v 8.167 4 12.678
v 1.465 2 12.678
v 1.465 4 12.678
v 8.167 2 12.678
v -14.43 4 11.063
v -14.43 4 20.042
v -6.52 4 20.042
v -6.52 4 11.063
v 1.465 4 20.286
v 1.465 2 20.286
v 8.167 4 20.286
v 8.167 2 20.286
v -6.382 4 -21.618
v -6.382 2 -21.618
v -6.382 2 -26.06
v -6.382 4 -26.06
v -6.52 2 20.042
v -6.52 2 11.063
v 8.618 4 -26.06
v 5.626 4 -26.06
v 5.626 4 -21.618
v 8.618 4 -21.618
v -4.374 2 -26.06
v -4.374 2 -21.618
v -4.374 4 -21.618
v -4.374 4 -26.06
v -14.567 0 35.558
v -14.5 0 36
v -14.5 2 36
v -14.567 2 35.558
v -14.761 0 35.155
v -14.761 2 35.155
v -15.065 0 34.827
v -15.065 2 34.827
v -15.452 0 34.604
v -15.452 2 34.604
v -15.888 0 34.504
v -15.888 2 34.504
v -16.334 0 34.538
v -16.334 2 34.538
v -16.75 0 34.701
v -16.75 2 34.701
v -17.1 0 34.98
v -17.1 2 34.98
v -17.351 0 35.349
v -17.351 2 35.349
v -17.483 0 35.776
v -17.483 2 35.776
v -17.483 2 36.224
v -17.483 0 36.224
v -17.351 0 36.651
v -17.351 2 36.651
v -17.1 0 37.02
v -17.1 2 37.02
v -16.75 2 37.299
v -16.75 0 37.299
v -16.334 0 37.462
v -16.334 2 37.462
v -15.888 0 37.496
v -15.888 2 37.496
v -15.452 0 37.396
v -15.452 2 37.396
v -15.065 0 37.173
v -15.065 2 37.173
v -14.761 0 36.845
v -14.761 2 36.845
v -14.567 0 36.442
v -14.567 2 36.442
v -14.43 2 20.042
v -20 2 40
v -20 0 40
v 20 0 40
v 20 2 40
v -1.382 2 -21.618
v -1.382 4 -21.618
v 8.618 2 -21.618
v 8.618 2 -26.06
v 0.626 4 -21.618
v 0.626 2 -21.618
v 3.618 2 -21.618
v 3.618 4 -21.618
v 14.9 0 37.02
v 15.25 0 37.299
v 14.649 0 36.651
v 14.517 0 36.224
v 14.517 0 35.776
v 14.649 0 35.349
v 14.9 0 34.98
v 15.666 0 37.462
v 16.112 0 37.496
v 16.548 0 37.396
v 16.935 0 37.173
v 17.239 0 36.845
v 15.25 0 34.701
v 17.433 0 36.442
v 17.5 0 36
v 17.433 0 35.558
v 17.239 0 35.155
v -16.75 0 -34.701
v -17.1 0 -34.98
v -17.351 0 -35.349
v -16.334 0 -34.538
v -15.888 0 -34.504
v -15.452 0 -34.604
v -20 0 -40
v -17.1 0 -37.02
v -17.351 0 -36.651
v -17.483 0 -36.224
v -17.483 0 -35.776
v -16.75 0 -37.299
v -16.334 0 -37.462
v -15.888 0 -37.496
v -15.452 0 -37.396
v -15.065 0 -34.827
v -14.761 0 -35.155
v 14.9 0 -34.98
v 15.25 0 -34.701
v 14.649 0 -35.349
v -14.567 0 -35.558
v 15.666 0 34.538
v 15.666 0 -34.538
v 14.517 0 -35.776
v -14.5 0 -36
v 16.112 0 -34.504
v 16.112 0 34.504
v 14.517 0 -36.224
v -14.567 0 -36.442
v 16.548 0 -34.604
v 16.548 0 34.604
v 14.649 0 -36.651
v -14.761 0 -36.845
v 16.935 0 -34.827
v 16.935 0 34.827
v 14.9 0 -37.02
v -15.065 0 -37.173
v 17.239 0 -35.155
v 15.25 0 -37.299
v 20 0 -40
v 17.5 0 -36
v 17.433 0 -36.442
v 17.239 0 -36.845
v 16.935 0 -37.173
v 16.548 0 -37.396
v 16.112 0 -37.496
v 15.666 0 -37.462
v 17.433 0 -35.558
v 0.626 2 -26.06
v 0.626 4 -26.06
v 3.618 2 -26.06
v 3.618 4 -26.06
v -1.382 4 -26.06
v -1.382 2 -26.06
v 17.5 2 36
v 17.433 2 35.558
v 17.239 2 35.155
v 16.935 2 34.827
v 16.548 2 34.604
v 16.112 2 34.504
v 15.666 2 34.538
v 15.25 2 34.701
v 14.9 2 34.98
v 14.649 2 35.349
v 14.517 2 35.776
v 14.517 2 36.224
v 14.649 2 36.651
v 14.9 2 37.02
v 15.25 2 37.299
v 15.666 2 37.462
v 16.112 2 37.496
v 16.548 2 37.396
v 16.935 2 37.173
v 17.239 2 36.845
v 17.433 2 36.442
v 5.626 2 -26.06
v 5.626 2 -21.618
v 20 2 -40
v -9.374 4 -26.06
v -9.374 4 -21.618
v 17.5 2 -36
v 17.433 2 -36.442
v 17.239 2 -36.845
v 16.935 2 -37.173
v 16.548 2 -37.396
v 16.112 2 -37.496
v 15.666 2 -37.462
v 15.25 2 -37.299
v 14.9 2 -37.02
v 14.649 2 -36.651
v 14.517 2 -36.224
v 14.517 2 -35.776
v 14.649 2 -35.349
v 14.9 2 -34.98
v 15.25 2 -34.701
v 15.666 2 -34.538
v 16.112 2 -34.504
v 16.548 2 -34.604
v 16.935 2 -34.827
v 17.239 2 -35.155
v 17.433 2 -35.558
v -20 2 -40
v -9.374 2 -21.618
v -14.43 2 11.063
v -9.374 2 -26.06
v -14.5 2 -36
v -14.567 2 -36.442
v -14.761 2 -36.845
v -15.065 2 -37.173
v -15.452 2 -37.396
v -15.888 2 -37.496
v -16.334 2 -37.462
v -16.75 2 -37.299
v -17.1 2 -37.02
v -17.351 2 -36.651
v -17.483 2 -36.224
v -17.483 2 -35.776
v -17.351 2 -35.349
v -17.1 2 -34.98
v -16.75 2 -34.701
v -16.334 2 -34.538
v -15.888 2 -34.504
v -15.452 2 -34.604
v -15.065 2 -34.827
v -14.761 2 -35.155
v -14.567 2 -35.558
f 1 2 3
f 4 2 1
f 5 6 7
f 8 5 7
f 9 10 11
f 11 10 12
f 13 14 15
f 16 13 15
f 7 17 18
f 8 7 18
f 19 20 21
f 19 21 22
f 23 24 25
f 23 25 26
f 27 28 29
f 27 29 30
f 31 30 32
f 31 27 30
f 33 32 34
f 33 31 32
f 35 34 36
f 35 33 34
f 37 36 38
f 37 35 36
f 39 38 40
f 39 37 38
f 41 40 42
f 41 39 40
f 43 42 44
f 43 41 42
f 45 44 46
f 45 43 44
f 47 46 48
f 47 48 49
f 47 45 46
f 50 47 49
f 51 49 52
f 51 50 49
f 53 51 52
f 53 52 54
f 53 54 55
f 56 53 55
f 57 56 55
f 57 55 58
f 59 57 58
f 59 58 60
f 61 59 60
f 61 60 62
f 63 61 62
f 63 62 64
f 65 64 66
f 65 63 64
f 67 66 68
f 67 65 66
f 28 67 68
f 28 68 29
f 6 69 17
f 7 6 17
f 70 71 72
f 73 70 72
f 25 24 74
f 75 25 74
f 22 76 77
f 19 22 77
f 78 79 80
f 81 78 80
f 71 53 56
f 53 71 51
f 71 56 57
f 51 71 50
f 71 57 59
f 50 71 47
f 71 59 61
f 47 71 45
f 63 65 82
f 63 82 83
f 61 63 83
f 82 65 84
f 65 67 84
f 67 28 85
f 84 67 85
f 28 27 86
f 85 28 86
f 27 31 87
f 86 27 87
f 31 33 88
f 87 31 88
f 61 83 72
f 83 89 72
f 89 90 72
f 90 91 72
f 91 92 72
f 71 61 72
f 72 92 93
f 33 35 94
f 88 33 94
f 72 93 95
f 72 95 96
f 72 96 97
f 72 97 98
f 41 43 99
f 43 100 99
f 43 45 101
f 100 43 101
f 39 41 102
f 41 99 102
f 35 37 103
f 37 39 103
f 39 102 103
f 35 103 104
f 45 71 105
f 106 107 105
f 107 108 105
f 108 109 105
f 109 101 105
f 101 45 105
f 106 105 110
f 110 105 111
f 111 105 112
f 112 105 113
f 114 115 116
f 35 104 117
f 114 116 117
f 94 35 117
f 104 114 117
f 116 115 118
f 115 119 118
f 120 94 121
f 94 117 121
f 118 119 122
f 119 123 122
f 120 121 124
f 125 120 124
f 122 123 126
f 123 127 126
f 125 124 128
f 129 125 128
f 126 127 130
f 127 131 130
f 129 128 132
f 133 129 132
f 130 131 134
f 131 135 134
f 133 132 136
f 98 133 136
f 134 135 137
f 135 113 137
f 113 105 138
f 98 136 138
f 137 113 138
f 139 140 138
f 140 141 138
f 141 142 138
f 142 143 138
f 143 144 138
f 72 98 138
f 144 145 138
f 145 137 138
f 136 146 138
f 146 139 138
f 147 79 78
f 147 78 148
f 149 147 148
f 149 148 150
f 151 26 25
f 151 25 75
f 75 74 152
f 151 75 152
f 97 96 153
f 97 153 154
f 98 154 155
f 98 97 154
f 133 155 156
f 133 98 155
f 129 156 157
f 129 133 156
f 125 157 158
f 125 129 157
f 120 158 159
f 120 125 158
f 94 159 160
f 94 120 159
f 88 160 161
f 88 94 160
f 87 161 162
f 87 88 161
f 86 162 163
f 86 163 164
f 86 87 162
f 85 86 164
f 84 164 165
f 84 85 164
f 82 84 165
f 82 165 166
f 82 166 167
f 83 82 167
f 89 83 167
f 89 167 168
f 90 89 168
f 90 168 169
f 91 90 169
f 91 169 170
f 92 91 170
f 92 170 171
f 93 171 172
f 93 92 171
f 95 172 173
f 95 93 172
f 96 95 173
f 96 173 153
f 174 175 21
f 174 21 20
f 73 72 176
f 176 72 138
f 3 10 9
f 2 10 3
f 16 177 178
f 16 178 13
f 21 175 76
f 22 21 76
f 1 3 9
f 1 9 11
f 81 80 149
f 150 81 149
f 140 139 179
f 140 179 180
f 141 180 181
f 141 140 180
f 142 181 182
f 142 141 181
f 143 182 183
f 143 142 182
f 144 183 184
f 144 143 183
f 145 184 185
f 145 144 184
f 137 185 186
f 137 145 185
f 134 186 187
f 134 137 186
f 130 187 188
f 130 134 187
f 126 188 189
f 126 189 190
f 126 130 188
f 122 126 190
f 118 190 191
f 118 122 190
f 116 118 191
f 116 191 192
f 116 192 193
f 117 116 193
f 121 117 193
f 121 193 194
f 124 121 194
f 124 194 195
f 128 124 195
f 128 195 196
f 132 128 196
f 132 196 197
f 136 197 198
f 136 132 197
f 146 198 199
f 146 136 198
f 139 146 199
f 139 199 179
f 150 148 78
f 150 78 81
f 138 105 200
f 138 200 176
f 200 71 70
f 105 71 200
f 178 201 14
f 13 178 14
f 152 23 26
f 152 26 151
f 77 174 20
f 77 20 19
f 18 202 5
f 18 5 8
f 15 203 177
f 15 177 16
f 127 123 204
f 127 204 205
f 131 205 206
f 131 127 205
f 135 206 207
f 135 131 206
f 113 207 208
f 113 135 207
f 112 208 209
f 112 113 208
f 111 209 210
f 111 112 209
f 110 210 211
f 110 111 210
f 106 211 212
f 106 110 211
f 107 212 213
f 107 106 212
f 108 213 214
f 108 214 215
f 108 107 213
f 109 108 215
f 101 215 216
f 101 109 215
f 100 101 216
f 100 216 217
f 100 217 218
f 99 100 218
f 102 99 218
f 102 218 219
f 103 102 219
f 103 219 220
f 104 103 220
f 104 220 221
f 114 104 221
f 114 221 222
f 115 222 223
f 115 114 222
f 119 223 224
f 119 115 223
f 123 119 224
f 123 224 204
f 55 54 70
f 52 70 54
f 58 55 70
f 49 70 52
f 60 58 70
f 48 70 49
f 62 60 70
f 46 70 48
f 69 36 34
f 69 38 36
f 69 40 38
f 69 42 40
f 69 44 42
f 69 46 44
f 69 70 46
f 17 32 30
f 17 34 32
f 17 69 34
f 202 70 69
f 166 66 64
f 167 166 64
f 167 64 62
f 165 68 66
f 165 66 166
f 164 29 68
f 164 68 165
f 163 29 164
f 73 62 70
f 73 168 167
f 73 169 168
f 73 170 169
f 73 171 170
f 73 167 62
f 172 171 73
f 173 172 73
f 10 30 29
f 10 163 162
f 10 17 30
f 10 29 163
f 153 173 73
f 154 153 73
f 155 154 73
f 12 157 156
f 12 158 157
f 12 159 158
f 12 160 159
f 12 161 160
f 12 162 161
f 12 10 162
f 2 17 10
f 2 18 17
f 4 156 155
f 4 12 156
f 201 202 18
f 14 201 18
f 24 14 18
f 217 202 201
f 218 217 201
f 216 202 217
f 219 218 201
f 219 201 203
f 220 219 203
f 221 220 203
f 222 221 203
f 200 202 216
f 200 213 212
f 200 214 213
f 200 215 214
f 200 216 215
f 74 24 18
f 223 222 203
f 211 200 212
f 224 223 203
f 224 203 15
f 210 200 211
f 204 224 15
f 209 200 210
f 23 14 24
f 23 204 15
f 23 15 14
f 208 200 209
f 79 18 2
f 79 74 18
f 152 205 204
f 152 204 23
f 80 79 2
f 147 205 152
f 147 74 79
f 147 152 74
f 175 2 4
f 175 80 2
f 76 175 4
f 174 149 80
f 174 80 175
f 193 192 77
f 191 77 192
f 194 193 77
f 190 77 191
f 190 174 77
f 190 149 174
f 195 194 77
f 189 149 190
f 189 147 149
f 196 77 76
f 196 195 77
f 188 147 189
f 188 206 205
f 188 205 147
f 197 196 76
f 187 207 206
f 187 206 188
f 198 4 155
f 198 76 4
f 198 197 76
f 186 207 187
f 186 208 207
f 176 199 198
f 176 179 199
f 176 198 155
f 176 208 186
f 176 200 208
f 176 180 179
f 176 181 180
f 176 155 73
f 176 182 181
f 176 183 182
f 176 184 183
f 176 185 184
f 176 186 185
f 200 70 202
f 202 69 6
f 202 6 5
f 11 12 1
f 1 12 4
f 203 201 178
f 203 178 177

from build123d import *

# Parameters (mm, degrees)
SKETCH_1_W      = 40
SKETCH_1_H      = 80
SKETCH_1_R      = 1.5
EXTRUDE_1_DEPTH = 2
SKETCH_2_W      = 6.701778473
SKETCH_2_H      = 7.607424212
SKETCH_2_W_2    = 7.9099244
SKETCH_2_H_2    = 8.978833102
SKETCH_2_W_3    = 2.99163276
SKETCH_2_H_3    = 4.442525683
EXTRUDE_2_DEPTH = 2


with BuildPart() as part:
    # 草图1 → 凸台-拉伸1 (new body)
    with BuildSketch(Plane(origin=(0, 0, 0), x_dir=(1, 0, 0), z_dir=(0, 1, 0))):
        Rectangle(SKETCH_1_W, SKETCH_1_H)
        with Locations((-16, 36)):
            Circle(SKETCH_1_R, mode=Mode.SUBTRACT)
        with Locations((16, 36)):
            Circle(SKETCH_1_R, mode=Mode.SUBTRACT)
        with Locations((16, -36)):
            Circle(SKETCH_1_R, mode=Mode.SUBTRACT)
        with Locations((-16, -36)):
            Circle(SKETCH_1_R, mode=Mode.SUBTRACT)
    extrude(amount=EXTRUDE_1_DEPTH)

    # 草图2 → 凸台-拉伸2 (add)
    with BuildSketch(Plane(origin=(0, 2, 0), x_dir=(1, 0, 0), z_dir=(0, 1, 0))):
        with Locations((4.815794002, -16.482035575)):
            Rectangle(SKETCH_2_W, SKETCH_2_H)
        with Locations((-10.475305286, -15.552621624)):
            Rectangle(SKETCH_2_W_2, SKETCH_2_H_2)
        with Locations((-7.87829503, 23.838782087)):
            Rectangle(SKETCH_2_W_3, SKETCH_2_H_3)
        with Locations((-2.87829503, 23.838782087)):
            Rectangle(SKETCH_2_W_3, SKETCH_2_H_3)
        with Locations((2.12170497, 23.838782087)):
            Rectangle(SKETCH_2_W_3, SKETCH_2_H_3)
        with Locations((7.12170497, 23.838782087)):
            Rectangle(SKETCH_2_W_3, SKETCH_2_H_3)
    extrude(amount=EXTRUDE_2_DEPTH)


solid = part.part
